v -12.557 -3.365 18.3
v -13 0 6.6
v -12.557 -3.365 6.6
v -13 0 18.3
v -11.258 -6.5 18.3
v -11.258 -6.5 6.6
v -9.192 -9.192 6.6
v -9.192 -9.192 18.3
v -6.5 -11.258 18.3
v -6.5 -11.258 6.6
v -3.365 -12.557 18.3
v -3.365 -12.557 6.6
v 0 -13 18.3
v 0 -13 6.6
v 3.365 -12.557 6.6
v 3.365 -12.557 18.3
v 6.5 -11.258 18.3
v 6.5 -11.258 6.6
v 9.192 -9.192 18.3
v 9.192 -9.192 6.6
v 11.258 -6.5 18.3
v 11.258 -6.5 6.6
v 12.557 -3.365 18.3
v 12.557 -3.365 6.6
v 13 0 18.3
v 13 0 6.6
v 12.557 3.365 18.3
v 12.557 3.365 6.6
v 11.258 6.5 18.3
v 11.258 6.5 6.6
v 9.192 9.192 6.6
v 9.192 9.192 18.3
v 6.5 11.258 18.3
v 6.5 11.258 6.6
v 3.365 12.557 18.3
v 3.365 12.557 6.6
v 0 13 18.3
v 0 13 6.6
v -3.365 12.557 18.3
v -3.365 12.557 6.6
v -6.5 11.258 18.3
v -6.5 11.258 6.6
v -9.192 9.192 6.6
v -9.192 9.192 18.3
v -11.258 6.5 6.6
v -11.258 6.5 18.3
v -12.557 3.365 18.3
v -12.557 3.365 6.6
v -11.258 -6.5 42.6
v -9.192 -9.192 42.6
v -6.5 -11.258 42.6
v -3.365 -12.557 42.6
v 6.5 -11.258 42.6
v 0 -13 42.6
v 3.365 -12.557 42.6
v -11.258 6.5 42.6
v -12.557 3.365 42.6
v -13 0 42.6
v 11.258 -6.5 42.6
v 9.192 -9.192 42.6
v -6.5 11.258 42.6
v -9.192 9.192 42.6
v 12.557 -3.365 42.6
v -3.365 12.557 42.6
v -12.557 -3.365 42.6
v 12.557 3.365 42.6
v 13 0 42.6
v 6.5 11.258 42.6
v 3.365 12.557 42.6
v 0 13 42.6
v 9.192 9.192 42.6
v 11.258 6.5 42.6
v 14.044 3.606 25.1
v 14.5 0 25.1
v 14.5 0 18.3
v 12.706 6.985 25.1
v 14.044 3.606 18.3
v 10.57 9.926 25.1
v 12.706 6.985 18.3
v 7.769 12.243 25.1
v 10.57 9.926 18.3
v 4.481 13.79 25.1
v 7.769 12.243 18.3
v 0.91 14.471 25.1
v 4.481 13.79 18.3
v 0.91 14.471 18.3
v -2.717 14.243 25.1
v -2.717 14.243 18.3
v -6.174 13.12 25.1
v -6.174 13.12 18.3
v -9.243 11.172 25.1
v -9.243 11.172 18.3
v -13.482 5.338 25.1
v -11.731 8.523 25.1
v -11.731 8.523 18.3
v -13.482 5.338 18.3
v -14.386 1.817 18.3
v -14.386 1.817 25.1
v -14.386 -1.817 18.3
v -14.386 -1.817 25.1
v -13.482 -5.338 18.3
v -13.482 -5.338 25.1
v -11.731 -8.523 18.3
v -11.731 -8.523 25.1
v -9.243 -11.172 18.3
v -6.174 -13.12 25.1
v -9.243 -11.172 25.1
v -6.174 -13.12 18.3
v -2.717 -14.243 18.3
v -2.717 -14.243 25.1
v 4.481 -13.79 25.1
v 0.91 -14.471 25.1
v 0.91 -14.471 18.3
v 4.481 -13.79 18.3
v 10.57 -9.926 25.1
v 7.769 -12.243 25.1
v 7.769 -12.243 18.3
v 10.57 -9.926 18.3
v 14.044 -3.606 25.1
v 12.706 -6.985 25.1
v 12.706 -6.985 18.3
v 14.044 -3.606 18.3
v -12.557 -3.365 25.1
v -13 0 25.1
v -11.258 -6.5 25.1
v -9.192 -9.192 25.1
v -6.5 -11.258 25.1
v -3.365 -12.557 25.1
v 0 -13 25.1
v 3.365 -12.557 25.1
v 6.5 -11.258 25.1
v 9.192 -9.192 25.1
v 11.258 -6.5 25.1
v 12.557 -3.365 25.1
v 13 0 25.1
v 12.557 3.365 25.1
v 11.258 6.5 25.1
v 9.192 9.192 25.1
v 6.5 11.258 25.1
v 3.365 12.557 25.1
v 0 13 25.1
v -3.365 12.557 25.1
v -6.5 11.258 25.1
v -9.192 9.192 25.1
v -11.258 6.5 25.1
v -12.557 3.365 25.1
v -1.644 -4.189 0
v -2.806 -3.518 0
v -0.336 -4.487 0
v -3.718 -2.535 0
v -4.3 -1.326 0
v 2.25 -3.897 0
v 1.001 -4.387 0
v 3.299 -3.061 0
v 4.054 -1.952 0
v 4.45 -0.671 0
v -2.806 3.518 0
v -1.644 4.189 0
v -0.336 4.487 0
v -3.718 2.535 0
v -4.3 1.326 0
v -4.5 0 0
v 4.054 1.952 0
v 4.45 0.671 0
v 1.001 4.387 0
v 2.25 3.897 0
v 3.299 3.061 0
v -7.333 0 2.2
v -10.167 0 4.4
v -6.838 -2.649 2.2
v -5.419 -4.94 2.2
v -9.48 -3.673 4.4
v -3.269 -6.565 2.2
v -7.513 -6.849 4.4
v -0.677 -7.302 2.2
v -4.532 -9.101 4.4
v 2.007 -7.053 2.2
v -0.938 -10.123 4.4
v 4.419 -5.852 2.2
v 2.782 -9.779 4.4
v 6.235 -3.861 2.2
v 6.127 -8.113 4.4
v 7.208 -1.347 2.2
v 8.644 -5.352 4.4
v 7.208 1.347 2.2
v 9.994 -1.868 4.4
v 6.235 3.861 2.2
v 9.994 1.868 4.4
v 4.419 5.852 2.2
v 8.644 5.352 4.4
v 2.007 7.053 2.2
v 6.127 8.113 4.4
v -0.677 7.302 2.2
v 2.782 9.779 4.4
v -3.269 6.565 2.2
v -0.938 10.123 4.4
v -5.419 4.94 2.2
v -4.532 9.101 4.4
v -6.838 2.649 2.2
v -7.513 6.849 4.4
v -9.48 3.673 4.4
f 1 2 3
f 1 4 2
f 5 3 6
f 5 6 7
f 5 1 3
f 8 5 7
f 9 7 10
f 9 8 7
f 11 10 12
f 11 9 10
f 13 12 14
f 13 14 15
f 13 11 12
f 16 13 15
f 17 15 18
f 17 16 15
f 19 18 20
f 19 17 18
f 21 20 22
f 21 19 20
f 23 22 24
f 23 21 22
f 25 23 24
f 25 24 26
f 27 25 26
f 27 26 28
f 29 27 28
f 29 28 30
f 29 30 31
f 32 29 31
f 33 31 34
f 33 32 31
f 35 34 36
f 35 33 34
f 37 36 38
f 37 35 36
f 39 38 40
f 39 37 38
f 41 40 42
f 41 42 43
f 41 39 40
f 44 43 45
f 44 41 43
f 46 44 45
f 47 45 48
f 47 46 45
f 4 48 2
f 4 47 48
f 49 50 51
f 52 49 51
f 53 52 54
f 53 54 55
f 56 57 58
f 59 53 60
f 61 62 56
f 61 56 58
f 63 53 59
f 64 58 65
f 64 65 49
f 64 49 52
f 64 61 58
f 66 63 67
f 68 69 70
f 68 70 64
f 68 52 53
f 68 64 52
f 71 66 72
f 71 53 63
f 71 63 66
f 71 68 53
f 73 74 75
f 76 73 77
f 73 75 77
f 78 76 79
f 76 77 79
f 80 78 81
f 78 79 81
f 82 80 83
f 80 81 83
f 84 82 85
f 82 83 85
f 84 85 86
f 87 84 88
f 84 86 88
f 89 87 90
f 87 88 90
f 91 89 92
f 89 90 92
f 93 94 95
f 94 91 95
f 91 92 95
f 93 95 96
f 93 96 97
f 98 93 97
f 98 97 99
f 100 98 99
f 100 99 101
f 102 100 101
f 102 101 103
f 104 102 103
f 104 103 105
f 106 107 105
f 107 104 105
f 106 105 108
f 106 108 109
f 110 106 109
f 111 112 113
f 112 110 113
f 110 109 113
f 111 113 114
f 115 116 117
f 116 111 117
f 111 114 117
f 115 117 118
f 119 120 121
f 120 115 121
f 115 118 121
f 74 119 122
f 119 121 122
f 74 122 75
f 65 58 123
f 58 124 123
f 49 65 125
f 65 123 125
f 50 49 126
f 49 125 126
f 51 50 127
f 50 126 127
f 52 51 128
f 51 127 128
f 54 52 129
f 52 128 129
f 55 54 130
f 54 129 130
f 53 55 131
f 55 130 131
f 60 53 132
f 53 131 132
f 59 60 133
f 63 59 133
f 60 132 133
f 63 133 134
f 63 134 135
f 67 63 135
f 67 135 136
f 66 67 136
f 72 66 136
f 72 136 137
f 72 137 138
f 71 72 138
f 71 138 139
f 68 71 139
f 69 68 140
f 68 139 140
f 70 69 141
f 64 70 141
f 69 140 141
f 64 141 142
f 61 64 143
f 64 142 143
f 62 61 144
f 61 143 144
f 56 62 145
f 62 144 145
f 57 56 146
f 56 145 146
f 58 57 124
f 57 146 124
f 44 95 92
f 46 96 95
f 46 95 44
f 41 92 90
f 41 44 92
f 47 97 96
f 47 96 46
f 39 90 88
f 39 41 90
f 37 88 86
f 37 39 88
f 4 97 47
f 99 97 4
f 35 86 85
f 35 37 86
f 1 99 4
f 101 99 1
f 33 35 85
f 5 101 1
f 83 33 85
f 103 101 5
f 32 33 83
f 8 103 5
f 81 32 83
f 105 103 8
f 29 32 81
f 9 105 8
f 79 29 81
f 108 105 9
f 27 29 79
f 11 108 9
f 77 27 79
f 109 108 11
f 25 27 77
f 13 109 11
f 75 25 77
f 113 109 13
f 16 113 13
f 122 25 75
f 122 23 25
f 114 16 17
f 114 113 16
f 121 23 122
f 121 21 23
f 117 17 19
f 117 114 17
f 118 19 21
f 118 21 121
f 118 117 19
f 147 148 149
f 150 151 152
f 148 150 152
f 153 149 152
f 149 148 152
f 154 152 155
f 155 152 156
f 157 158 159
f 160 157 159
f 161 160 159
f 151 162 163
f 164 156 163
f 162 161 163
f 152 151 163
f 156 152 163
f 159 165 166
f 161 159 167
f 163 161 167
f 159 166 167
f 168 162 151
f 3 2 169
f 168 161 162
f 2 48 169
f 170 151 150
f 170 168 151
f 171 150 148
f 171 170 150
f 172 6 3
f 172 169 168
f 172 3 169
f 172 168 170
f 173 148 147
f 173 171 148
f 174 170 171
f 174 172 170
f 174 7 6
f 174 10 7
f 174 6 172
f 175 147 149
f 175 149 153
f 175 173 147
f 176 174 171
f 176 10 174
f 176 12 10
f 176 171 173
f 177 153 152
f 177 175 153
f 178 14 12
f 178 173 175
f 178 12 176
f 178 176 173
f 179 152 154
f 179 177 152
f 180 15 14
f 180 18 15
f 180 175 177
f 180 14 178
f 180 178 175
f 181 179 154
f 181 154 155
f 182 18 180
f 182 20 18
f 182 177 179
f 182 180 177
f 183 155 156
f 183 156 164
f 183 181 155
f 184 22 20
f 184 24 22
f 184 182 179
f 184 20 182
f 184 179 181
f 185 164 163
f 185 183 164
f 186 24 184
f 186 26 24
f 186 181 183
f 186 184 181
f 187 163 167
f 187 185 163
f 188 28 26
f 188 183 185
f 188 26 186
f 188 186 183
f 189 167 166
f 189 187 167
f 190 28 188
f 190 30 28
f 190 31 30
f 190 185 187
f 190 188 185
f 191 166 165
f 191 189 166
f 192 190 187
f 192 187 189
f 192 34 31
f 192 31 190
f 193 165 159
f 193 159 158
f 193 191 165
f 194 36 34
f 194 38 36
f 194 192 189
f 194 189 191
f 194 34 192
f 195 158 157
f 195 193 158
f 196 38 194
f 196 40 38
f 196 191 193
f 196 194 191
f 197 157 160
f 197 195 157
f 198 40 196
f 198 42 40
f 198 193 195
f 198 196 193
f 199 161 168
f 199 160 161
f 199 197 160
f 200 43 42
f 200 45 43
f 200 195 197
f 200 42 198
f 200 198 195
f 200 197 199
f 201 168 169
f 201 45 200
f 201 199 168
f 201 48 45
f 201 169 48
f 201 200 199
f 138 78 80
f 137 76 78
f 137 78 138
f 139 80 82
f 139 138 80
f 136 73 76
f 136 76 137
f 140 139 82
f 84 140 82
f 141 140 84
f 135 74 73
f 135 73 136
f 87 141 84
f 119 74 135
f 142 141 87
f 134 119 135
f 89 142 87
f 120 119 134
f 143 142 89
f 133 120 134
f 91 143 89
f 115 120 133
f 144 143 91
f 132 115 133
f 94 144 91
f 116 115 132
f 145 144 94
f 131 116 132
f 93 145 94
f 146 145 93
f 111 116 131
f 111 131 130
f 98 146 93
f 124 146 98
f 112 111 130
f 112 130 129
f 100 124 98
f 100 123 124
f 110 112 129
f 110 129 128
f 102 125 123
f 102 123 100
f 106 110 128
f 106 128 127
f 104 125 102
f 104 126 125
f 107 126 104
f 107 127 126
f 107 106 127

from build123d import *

# Parameters (mm, degrees)
SKETCH_1_R      = 14.5
EXTRUDE_1_DEPTH = 42.6
SKETCH_3_W      = 1.5
SKETCH_3_H      = 17.5


with BuildPart() as part:
    # 草圖1 → 填料-伸長1 (new body)
    with BuildSketch(Plane.XY):
        Circle(SKETCH_1_R)
    extrude(amount=EXTRUDE_1_DEPTH)

    # 草圖3 → 除料-旋轉1 (revolve, cut)
    with BuildSketch(Plane(origin=(0, 0, 0), x_dir=(1, 0, 0), z_dir=(0, 1, 0))):
        Polygon((-4.5, 0), (-13, -6.6), (-13, -18.3), (-14.5, -18.3), (-14.5, 0), align=None)
        with Locations((-13.75, -33.85)):
            Rectangle(SKETCH_3_W, SKETCH_3_H)
    revolve(axis=Axis((0, 0, 0), (0, 0, 1)), mode=Mode.SUBTRACT)


solid = part.part
